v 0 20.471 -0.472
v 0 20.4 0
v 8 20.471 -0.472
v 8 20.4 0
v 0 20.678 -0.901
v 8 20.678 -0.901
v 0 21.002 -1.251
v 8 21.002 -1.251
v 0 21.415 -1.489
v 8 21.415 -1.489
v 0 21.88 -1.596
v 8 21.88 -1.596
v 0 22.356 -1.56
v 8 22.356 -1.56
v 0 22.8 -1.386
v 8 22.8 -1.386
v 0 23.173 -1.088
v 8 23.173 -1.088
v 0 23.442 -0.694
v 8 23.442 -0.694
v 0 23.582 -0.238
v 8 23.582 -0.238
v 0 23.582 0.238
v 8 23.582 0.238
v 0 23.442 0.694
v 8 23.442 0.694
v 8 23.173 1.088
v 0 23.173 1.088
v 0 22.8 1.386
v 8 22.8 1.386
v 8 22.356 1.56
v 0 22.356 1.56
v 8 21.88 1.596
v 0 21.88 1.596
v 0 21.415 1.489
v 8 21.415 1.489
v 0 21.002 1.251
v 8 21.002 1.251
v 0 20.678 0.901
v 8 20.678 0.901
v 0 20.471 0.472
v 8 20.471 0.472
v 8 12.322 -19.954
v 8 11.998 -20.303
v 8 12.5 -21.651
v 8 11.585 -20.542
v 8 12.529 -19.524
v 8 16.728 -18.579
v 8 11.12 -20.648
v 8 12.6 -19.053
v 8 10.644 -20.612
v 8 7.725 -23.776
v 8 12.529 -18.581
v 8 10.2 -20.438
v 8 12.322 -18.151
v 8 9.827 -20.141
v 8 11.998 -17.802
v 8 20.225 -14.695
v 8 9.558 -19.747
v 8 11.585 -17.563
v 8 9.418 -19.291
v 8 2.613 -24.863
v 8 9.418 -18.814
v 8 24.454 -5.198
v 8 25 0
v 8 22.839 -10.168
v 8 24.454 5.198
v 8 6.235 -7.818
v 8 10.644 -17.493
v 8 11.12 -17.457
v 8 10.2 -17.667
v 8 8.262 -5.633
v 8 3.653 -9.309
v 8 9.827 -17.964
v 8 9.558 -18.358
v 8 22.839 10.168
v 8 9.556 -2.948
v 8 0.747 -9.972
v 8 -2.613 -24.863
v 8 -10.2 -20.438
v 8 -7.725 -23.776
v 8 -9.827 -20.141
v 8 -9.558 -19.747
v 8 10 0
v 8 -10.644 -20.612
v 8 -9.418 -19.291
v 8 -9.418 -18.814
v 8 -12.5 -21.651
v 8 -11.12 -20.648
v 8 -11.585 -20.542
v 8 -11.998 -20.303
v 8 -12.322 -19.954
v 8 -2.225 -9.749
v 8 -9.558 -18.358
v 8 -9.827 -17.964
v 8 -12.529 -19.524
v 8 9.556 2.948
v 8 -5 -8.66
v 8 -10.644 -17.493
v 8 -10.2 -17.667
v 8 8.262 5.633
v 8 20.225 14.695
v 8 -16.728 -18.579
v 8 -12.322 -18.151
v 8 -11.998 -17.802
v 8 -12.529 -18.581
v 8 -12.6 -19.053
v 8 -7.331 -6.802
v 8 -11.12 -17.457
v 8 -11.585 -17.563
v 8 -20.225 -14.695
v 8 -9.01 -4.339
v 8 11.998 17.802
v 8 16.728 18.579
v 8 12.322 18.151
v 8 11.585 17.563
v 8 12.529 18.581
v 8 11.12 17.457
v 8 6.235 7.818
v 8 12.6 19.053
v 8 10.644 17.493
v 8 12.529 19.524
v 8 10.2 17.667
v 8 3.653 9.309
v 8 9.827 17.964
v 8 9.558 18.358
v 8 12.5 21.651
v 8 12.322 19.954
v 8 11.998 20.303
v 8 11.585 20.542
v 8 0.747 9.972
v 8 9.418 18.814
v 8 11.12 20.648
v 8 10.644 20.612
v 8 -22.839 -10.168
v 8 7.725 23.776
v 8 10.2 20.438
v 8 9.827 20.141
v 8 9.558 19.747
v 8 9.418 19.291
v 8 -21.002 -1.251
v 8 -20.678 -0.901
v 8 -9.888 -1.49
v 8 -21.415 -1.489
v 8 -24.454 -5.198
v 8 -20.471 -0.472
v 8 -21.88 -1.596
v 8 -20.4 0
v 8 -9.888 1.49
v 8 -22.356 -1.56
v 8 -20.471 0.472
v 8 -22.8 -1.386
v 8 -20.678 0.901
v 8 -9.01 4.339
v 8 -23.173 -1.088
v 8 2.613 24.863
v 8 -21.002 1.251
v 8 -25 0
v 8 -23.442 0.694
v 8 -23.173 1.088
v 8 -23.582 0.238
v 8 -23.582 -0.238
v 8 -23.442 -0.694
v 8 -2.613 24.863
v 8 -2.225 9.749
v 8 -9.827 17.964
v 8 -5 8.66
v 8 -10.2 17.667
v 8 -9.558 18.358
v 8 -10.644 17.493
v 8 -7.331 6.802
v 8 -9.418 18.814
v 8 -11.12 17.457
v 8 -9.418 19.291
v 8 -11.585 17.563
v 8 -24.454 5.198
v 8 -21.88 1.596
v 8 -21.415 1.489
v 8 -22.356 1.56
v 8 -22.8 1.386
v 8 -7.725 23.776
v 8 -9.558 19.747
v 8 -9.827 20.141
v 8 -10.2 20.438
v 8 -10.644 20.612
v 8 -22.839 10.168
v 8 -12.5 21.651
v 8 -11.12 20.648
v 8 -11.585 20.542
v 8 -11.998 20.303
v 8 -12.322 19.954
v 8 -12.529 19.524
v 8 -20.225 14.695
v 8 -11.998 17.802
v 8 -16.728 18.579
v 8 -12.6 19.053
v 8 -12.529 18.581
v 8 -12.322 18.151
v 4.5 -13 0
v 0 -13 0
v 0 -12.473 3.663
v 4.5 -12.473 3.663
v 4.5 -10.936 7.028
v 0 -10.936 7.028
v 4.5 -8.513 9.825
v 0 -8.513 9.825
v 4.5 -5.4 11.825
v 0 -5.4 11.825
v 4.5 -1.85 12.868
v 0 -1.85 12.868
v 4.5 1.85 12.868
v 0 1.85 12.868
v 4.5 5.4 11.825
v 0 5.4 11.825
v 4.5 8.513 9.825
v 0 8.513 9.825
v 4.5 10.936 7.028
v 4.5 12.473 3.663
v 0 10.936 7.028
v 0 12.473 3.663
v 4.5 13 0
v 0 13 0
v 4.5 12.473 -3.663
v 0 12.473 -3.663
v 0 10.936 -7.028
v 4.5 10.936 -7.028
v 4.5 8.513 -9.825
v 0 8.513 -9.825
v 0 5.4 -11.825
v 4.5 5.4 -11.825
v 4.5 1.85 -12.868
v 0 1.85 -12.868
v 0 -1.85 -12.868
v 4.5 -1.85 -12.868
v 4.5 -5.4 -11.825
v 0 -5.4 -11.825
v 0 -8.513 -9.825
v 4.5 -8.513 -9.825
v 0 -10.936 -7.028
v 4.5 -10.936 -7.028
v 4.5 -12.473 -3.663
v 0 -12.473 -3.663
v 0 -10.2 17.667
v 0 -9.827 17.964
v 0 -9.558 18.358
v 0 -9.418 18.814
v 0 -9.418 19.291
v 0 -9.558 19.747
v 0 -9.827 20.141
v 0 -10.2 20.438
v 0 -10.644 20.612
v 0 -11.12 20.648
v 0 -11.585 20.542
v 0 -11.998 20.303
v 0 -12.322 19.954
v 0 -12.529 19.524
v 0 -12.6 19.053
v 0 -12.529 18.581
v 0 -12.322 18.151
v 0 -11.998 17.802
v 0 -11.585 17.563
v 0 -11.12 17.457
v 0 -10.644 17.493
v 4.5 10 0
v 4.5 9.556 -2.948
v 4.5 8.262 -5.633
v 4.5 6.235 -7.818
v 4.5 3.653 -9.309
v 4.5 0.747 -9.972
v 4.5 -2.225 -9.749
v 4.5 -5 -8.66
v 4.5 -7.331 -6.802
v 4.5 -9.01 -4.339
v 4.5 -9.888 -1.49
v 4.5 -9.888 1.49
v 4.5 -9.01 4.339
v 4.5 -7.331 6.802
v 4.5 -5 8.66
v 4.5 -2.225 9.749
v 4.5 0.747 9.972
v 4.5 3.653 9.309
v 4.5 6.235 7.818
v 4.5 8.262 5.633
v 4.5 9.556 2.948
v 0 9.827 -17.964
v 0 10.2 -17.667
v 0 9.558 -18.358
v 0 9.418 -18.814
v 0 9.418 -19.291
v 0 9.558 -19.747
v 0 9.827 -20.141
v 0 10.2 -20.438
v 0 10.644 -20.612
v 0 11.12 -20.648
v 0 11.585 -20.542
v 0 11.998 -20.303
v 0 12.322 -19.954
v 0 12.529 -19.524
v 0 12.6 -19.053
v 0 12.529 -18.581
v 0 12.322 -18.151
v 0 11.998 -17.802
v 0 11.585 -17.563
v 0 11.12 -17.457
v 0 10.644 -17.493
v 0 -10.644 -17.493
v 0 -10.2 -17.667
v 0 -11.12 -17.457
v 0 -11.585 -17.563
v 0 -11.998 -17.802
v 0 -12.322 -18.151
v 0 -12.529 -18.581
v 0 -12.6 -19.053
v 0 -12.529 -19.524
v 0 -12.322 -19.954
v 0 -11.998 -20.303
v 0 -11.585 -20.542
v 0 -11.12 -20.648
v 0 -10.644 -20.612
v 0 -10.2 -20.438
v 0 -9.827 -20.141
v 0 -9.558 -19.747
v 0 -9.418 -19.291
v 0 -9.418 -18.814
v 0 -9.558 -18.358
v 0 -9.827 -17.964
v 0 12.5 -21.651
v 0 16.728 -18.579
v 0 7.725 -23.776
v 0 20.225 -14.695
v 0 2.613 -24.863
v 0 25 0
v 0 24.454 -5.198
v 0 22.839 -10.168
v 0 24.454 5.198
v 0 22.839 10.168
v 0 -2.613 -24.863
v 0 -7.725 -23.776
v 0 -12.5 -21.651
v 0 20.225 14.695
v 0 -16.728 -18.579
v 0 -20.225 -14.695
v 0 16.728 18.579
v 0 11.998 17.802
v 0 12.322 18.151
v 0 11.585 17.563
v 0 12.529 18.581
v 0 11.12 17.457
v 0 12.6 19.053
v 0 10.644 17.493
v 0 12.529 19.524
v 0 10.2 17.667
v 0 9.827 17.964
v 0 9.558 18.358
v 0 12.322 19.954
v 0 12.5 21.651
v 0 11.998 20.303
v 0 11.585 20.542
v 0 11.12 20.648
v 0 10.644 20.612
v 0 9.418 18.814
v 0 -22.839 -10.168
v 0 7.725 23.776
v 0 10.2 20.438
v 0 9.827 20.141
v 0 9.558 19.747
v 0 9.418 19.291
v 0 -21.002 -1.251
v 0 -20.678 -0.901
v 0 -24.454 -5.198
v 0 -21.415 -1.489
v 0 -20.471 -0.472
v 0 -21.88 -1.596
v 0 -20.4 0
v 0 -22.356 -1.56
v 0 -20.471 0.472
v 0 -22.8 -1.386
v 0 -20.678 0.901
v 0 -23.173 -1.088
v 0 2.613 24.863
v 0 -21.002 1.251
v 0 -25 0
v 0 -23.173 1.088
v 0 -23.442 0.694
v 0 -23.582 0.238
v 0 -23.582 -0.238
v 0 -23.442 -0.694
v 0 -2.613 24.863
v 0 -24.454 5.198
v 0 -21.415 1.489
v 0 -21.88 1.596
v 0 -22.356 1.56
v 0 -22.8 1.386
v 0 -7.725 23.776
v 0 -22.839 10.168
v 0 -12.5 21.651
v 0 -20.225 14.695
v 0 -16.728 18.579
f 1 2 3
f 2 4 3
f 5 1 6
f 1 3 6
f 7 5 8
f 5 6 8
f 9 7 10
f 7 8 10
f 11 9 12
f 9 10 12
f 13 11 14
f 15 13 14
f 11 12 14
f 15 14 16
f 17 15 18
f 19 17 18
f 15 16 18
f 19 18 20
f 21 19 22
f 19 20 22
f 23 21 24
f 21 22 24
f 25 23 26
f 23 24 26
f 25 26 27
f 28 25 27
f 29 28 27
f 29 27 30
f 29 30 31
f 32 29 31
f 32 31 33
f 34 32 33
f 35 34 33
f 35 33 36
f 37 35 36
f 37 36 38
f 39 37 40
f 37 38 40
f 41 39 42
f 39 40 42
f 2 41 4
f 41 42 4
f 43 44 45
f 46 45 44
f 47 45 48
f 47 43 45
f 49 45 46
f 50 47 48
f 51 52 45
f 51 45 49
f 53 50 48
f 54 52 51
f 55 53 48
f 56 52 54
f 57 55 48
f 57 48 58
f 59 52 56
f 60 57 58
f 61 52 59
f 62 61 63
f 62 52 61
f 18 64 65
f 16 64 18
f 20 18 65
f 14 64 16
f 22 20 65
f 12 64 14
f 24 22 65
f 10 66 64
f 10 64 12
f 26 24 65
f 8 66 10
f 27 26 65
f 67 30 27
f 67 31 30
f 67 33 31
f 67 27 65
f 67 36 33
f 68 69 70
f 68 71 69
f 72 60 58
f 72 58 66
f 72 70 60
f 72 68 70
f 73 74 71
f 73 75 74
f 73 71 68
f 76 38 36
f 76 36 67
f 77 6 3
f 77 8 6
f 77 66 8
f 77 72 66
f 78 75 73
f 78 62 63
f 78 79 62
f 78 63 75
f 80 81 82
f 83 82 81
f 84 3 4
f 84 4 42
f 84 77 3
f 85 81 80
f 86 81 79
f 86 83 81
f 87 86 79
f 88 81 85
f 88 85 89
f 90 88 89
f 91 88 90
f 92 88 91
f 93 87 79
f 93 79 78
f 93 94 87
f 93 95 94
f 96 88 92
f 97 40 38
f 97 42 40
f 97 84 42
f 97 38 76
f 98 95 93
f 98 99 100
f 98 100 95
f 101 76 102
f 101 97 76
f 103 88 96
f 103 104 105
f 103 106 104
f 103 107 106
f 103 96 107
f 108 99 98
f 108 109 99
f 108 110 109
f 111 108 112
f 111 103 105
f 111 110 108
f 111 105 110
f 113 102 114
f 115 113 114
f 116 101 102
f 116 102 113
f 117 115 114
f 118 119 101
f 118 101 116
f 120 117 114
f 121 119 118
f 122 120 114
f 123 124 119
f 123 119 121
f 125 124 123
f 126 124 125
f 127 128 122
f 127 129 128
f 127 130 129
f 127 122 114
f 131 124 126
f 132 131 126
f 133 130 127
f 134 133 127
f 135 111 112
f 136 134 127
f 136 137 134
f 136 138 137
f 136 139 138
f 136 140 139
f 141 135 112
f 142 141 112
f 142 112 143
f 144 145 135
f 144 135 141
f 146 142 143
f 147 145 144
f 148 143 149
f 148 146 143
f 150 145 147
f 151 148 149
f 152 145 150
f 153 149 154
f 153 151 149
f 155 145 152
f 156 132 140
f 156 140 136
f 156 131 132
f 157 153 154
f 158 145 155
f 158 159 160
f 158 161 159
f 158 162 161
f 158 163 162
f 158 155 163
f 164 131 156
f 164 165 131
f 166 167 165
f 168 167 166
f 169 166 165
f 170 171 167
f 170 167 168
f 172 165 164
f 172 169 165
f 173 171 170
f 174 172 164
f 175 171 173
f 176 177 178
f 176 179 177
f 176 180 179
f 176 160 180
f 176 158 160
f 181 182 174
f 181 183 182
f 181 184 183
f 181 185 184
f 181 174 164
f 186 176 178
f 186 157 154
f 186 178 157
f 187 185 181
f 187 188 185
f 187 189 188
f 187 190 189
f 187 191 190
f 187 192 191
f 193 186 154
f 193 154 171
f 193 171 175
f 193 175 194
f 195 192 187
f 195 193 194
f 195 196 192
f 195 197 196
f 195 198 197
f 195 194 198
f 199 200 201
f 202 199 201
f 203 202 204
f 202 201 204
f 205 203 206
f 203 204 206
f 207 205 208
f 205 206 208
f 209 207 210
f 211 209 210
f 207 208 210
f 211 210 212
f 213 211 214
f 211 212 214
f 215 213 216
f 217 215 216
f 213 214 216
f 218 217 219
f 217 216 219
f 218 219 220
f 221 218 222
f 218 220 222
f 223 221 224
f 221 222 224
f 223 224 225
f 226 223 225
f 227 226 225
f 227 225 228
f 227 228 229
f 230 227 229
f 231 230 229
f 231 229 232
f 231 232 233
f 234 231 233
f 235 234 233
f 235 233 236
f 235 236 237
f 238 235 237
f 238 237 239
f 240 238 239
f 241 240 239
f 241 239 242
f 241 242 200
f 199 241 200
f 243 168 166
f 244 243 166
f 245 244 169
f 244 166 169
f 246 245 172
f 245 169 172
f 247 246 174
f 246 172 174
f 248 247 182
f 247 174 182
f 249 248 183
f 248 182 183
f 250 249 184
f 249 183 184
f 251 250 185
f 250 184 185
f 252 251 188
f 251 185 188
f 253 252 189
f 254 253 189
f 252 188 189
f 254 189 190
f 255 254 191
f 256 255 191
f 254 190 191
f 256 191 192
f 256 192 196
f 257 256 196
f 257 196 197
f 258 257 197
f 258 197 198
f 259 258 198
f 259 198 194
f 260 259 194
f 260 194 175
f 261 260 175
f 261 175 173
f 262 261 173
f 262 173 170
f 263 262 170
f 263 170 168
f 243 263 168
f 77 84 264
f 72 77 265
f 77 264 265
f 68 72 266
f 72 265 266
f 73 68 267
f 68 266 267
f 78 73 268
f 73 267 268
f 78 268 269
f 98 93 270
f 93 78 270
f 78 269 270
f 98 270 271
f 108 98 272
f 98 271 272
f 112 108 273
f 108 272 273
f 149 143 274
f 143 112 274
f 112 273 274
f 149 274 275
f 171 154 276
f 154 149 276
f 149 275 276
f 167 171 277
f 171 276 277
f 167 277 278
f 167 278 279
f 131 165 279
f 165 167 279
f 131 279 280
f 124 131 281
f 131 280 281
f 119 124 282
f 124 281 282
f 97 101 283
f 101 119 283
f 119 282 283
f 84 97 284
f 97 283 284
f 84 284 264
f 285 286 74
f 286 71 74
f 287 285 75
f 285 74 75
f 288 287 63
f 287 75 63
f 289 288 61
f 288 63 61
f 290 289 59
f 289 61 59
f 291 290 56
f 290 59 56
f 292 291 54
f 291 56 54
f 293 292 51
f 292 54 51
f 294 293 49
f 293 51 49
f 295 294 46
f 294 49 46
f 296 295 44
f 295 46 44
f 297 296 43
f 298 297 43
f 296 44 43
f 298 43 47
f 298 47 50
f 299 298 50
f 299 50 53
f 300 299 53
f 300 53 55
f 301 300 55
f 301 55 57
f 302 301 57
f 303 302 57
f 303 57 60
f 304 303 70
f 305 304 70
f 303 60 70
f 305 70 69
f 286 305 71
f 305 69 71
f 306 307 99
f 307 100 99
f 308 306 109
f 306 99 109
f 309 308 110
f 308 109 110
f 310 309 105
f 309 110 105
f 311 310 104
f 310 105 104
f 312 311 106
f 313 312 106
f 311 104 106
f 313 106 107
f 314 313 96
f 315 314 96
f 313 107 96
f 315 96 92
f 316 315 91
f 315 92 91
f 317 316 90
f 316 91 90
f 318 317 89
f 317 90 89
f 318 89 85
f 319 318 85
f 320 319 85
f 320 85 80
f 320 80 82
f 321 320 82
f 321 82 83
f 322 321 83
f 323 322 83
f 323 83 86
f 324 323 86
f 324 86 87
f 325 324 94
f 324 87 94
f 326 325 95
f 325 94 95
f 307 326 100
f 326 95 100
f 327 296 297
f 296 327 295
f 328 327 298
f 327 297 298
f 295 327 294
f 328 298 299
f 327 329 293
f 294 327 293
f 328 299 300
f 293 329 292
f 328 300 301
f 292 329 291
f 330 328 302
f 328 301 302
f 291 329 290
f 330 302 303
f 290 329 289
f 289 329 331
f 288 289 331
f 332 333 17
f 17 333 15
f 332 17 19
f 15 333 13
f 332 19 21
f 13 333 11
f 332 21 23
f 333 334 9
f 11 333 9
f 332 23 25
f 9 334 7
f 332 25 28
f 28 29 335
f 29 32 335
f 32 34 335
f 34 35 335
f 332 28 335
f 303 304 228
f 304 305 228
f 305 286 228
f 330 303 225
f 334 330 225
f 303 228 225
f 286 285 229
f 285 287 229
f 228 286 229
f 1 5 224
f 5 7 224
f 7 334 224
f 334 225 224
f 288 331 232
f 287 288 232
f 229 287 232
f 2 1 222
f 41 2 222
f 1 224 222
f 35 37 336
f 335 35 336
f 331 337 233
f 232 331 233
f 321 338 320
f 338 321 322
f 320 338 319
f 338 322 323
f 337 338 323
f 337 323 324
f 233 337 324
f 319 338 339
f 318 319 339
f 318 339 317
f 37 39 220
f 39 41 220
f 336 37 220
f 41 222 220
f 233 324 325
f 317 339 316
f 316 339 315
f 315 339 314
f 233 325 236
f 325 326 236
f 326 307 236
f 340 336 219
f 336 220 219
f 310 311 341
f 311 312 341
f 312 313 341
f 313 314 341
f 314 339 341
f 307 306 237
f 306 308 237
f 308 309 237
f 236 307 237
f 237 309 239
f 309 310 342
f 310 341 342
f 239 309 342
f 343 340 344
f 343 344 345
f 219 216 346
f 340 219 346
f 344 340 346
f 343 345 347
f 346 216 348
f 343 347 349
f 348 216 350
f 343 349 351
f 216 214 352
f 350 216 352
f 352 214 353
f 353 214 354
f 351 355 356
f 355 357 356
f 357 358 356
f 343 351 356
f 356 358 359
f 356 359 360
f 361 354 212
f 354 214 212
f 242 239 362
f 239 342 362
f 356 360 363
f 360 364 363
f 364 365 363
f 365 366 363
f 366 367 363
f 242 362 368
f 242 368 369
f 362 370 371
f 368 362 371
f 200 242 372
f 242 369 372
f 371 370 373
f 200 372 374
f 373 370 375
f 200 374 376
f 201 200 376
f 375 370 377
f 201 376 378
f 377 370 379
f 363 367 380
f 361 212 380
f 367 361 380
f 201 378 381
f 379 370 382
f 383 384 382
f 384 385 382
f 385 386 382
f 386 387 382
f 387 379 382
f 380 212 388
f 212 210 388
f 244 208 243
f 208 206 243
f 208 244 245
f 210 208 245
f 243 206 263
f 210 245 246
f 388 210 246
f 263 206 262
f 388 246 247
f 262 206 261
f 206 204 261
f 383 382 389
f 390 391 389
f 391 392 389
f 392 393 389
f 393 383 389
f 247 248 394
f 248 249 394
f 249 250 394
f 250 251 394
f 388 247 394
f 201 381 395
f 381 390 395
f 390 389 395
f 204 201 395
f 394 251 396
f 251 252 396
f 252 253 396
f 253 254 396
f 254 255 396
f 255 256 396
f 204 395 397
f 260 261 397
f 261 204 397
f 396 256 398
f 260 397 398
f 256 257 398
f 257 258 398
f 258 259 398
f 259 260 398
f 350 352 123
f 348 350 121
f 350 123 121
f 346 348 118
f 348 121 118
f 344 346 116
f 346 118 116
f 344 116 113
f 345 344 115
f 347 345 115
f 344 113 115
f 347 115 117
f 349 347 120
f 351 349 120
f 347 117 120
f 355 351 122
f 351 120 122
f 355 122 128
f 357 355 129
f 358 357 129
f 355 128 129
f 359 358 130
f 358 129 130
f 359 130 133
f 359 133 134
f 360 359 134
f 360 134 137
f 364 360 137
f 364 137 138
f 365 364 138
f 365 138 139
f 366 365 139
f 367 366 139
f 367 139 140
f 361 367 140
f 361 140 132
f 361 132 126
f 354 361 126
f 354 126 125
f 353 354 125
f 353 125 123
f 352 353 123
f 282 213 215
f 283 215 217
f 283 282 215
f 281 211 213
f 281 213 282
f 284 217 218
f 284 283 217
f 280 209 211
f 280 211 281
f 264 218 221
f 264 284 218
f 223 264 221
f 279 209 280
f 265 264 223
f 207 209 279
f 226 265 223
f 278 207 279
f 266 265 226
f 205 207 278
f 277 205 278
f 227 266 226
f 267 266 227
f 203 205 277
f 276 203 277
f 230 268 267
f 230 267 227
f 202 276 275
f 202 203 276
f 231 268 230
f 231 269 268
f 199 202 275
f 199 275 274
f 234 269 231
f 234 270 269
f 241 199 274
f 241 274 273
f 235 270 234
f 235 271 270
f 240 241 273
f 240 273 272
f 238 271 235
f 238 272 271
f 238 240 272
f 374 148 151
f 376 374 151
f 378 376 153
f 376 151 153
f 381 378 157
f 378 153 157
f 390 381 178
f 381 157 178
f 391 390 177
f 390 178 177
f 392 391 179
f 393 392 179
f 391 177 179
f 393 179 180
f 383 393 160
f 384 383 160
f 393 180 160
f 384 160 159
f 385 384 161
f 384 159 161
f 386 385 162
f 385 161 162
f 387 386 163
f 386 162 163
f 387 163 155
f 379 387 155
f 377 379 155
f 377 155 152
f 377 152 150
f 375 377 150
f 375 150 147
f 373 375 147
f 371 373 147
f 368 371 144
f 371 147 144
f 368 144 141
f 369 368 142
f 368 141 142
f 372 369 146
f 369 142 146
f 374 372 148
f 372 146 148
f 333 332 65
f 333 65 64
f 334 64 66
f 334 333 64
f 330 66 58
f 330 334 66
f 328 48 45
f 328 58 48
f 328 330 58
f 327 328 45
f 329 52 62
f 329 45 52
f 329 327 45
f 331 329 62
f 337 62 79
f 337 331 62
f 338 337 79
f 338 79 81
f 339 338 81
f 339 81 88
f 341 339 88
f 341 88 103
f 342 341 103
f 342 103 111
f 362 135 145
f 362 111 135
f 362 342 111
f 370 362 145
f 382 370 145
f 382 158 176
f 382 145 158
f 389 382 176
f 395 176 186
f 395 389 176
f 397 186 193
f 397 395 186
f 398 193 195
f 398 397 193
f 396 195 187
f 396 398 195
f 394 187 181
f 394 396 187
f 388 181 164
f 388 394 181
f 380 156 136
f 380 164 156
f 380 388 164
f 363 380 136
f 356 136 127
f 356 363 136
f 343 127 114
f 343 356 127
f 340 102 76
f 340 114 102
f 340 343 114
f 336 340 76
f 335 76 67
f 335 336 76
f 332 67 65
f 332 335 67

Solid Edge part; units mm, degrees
sketch "Sketch1" plane through (0, 0, 0) normal (1, 0, 0) x (0, 1, 0)
  circle A0 centre (0, 0) radius 10
  circle A1 centre (0, 0) radius 25
extrude "Protrusion1" add sketch "Sketch1" along normal blind 8
sketch "Sketch2" plane through (0, 0, 0) normal (-1, 0, 0) x (0, -1, 0)
  circle A0 centre (0, 0) radius 13
extrude "ExtrudedCutout_1" cut sketch "Sketch2" against normal blind 4.5
sketch "Sketch3" plane through (8, 0, 0) normal (1, 0, 0) x (0, 1, 0)
  circle A0 centre (-22, 0) radius 1.6
  dimension "D1" = 22
extrude "Cutout1" cut sketch "Sketch3" against normal up to next
pattern_circular "Pattern1" count 6 over 360 about axis through (8, 0, 0) along (-1, 0, 0) of "Cutout1"
